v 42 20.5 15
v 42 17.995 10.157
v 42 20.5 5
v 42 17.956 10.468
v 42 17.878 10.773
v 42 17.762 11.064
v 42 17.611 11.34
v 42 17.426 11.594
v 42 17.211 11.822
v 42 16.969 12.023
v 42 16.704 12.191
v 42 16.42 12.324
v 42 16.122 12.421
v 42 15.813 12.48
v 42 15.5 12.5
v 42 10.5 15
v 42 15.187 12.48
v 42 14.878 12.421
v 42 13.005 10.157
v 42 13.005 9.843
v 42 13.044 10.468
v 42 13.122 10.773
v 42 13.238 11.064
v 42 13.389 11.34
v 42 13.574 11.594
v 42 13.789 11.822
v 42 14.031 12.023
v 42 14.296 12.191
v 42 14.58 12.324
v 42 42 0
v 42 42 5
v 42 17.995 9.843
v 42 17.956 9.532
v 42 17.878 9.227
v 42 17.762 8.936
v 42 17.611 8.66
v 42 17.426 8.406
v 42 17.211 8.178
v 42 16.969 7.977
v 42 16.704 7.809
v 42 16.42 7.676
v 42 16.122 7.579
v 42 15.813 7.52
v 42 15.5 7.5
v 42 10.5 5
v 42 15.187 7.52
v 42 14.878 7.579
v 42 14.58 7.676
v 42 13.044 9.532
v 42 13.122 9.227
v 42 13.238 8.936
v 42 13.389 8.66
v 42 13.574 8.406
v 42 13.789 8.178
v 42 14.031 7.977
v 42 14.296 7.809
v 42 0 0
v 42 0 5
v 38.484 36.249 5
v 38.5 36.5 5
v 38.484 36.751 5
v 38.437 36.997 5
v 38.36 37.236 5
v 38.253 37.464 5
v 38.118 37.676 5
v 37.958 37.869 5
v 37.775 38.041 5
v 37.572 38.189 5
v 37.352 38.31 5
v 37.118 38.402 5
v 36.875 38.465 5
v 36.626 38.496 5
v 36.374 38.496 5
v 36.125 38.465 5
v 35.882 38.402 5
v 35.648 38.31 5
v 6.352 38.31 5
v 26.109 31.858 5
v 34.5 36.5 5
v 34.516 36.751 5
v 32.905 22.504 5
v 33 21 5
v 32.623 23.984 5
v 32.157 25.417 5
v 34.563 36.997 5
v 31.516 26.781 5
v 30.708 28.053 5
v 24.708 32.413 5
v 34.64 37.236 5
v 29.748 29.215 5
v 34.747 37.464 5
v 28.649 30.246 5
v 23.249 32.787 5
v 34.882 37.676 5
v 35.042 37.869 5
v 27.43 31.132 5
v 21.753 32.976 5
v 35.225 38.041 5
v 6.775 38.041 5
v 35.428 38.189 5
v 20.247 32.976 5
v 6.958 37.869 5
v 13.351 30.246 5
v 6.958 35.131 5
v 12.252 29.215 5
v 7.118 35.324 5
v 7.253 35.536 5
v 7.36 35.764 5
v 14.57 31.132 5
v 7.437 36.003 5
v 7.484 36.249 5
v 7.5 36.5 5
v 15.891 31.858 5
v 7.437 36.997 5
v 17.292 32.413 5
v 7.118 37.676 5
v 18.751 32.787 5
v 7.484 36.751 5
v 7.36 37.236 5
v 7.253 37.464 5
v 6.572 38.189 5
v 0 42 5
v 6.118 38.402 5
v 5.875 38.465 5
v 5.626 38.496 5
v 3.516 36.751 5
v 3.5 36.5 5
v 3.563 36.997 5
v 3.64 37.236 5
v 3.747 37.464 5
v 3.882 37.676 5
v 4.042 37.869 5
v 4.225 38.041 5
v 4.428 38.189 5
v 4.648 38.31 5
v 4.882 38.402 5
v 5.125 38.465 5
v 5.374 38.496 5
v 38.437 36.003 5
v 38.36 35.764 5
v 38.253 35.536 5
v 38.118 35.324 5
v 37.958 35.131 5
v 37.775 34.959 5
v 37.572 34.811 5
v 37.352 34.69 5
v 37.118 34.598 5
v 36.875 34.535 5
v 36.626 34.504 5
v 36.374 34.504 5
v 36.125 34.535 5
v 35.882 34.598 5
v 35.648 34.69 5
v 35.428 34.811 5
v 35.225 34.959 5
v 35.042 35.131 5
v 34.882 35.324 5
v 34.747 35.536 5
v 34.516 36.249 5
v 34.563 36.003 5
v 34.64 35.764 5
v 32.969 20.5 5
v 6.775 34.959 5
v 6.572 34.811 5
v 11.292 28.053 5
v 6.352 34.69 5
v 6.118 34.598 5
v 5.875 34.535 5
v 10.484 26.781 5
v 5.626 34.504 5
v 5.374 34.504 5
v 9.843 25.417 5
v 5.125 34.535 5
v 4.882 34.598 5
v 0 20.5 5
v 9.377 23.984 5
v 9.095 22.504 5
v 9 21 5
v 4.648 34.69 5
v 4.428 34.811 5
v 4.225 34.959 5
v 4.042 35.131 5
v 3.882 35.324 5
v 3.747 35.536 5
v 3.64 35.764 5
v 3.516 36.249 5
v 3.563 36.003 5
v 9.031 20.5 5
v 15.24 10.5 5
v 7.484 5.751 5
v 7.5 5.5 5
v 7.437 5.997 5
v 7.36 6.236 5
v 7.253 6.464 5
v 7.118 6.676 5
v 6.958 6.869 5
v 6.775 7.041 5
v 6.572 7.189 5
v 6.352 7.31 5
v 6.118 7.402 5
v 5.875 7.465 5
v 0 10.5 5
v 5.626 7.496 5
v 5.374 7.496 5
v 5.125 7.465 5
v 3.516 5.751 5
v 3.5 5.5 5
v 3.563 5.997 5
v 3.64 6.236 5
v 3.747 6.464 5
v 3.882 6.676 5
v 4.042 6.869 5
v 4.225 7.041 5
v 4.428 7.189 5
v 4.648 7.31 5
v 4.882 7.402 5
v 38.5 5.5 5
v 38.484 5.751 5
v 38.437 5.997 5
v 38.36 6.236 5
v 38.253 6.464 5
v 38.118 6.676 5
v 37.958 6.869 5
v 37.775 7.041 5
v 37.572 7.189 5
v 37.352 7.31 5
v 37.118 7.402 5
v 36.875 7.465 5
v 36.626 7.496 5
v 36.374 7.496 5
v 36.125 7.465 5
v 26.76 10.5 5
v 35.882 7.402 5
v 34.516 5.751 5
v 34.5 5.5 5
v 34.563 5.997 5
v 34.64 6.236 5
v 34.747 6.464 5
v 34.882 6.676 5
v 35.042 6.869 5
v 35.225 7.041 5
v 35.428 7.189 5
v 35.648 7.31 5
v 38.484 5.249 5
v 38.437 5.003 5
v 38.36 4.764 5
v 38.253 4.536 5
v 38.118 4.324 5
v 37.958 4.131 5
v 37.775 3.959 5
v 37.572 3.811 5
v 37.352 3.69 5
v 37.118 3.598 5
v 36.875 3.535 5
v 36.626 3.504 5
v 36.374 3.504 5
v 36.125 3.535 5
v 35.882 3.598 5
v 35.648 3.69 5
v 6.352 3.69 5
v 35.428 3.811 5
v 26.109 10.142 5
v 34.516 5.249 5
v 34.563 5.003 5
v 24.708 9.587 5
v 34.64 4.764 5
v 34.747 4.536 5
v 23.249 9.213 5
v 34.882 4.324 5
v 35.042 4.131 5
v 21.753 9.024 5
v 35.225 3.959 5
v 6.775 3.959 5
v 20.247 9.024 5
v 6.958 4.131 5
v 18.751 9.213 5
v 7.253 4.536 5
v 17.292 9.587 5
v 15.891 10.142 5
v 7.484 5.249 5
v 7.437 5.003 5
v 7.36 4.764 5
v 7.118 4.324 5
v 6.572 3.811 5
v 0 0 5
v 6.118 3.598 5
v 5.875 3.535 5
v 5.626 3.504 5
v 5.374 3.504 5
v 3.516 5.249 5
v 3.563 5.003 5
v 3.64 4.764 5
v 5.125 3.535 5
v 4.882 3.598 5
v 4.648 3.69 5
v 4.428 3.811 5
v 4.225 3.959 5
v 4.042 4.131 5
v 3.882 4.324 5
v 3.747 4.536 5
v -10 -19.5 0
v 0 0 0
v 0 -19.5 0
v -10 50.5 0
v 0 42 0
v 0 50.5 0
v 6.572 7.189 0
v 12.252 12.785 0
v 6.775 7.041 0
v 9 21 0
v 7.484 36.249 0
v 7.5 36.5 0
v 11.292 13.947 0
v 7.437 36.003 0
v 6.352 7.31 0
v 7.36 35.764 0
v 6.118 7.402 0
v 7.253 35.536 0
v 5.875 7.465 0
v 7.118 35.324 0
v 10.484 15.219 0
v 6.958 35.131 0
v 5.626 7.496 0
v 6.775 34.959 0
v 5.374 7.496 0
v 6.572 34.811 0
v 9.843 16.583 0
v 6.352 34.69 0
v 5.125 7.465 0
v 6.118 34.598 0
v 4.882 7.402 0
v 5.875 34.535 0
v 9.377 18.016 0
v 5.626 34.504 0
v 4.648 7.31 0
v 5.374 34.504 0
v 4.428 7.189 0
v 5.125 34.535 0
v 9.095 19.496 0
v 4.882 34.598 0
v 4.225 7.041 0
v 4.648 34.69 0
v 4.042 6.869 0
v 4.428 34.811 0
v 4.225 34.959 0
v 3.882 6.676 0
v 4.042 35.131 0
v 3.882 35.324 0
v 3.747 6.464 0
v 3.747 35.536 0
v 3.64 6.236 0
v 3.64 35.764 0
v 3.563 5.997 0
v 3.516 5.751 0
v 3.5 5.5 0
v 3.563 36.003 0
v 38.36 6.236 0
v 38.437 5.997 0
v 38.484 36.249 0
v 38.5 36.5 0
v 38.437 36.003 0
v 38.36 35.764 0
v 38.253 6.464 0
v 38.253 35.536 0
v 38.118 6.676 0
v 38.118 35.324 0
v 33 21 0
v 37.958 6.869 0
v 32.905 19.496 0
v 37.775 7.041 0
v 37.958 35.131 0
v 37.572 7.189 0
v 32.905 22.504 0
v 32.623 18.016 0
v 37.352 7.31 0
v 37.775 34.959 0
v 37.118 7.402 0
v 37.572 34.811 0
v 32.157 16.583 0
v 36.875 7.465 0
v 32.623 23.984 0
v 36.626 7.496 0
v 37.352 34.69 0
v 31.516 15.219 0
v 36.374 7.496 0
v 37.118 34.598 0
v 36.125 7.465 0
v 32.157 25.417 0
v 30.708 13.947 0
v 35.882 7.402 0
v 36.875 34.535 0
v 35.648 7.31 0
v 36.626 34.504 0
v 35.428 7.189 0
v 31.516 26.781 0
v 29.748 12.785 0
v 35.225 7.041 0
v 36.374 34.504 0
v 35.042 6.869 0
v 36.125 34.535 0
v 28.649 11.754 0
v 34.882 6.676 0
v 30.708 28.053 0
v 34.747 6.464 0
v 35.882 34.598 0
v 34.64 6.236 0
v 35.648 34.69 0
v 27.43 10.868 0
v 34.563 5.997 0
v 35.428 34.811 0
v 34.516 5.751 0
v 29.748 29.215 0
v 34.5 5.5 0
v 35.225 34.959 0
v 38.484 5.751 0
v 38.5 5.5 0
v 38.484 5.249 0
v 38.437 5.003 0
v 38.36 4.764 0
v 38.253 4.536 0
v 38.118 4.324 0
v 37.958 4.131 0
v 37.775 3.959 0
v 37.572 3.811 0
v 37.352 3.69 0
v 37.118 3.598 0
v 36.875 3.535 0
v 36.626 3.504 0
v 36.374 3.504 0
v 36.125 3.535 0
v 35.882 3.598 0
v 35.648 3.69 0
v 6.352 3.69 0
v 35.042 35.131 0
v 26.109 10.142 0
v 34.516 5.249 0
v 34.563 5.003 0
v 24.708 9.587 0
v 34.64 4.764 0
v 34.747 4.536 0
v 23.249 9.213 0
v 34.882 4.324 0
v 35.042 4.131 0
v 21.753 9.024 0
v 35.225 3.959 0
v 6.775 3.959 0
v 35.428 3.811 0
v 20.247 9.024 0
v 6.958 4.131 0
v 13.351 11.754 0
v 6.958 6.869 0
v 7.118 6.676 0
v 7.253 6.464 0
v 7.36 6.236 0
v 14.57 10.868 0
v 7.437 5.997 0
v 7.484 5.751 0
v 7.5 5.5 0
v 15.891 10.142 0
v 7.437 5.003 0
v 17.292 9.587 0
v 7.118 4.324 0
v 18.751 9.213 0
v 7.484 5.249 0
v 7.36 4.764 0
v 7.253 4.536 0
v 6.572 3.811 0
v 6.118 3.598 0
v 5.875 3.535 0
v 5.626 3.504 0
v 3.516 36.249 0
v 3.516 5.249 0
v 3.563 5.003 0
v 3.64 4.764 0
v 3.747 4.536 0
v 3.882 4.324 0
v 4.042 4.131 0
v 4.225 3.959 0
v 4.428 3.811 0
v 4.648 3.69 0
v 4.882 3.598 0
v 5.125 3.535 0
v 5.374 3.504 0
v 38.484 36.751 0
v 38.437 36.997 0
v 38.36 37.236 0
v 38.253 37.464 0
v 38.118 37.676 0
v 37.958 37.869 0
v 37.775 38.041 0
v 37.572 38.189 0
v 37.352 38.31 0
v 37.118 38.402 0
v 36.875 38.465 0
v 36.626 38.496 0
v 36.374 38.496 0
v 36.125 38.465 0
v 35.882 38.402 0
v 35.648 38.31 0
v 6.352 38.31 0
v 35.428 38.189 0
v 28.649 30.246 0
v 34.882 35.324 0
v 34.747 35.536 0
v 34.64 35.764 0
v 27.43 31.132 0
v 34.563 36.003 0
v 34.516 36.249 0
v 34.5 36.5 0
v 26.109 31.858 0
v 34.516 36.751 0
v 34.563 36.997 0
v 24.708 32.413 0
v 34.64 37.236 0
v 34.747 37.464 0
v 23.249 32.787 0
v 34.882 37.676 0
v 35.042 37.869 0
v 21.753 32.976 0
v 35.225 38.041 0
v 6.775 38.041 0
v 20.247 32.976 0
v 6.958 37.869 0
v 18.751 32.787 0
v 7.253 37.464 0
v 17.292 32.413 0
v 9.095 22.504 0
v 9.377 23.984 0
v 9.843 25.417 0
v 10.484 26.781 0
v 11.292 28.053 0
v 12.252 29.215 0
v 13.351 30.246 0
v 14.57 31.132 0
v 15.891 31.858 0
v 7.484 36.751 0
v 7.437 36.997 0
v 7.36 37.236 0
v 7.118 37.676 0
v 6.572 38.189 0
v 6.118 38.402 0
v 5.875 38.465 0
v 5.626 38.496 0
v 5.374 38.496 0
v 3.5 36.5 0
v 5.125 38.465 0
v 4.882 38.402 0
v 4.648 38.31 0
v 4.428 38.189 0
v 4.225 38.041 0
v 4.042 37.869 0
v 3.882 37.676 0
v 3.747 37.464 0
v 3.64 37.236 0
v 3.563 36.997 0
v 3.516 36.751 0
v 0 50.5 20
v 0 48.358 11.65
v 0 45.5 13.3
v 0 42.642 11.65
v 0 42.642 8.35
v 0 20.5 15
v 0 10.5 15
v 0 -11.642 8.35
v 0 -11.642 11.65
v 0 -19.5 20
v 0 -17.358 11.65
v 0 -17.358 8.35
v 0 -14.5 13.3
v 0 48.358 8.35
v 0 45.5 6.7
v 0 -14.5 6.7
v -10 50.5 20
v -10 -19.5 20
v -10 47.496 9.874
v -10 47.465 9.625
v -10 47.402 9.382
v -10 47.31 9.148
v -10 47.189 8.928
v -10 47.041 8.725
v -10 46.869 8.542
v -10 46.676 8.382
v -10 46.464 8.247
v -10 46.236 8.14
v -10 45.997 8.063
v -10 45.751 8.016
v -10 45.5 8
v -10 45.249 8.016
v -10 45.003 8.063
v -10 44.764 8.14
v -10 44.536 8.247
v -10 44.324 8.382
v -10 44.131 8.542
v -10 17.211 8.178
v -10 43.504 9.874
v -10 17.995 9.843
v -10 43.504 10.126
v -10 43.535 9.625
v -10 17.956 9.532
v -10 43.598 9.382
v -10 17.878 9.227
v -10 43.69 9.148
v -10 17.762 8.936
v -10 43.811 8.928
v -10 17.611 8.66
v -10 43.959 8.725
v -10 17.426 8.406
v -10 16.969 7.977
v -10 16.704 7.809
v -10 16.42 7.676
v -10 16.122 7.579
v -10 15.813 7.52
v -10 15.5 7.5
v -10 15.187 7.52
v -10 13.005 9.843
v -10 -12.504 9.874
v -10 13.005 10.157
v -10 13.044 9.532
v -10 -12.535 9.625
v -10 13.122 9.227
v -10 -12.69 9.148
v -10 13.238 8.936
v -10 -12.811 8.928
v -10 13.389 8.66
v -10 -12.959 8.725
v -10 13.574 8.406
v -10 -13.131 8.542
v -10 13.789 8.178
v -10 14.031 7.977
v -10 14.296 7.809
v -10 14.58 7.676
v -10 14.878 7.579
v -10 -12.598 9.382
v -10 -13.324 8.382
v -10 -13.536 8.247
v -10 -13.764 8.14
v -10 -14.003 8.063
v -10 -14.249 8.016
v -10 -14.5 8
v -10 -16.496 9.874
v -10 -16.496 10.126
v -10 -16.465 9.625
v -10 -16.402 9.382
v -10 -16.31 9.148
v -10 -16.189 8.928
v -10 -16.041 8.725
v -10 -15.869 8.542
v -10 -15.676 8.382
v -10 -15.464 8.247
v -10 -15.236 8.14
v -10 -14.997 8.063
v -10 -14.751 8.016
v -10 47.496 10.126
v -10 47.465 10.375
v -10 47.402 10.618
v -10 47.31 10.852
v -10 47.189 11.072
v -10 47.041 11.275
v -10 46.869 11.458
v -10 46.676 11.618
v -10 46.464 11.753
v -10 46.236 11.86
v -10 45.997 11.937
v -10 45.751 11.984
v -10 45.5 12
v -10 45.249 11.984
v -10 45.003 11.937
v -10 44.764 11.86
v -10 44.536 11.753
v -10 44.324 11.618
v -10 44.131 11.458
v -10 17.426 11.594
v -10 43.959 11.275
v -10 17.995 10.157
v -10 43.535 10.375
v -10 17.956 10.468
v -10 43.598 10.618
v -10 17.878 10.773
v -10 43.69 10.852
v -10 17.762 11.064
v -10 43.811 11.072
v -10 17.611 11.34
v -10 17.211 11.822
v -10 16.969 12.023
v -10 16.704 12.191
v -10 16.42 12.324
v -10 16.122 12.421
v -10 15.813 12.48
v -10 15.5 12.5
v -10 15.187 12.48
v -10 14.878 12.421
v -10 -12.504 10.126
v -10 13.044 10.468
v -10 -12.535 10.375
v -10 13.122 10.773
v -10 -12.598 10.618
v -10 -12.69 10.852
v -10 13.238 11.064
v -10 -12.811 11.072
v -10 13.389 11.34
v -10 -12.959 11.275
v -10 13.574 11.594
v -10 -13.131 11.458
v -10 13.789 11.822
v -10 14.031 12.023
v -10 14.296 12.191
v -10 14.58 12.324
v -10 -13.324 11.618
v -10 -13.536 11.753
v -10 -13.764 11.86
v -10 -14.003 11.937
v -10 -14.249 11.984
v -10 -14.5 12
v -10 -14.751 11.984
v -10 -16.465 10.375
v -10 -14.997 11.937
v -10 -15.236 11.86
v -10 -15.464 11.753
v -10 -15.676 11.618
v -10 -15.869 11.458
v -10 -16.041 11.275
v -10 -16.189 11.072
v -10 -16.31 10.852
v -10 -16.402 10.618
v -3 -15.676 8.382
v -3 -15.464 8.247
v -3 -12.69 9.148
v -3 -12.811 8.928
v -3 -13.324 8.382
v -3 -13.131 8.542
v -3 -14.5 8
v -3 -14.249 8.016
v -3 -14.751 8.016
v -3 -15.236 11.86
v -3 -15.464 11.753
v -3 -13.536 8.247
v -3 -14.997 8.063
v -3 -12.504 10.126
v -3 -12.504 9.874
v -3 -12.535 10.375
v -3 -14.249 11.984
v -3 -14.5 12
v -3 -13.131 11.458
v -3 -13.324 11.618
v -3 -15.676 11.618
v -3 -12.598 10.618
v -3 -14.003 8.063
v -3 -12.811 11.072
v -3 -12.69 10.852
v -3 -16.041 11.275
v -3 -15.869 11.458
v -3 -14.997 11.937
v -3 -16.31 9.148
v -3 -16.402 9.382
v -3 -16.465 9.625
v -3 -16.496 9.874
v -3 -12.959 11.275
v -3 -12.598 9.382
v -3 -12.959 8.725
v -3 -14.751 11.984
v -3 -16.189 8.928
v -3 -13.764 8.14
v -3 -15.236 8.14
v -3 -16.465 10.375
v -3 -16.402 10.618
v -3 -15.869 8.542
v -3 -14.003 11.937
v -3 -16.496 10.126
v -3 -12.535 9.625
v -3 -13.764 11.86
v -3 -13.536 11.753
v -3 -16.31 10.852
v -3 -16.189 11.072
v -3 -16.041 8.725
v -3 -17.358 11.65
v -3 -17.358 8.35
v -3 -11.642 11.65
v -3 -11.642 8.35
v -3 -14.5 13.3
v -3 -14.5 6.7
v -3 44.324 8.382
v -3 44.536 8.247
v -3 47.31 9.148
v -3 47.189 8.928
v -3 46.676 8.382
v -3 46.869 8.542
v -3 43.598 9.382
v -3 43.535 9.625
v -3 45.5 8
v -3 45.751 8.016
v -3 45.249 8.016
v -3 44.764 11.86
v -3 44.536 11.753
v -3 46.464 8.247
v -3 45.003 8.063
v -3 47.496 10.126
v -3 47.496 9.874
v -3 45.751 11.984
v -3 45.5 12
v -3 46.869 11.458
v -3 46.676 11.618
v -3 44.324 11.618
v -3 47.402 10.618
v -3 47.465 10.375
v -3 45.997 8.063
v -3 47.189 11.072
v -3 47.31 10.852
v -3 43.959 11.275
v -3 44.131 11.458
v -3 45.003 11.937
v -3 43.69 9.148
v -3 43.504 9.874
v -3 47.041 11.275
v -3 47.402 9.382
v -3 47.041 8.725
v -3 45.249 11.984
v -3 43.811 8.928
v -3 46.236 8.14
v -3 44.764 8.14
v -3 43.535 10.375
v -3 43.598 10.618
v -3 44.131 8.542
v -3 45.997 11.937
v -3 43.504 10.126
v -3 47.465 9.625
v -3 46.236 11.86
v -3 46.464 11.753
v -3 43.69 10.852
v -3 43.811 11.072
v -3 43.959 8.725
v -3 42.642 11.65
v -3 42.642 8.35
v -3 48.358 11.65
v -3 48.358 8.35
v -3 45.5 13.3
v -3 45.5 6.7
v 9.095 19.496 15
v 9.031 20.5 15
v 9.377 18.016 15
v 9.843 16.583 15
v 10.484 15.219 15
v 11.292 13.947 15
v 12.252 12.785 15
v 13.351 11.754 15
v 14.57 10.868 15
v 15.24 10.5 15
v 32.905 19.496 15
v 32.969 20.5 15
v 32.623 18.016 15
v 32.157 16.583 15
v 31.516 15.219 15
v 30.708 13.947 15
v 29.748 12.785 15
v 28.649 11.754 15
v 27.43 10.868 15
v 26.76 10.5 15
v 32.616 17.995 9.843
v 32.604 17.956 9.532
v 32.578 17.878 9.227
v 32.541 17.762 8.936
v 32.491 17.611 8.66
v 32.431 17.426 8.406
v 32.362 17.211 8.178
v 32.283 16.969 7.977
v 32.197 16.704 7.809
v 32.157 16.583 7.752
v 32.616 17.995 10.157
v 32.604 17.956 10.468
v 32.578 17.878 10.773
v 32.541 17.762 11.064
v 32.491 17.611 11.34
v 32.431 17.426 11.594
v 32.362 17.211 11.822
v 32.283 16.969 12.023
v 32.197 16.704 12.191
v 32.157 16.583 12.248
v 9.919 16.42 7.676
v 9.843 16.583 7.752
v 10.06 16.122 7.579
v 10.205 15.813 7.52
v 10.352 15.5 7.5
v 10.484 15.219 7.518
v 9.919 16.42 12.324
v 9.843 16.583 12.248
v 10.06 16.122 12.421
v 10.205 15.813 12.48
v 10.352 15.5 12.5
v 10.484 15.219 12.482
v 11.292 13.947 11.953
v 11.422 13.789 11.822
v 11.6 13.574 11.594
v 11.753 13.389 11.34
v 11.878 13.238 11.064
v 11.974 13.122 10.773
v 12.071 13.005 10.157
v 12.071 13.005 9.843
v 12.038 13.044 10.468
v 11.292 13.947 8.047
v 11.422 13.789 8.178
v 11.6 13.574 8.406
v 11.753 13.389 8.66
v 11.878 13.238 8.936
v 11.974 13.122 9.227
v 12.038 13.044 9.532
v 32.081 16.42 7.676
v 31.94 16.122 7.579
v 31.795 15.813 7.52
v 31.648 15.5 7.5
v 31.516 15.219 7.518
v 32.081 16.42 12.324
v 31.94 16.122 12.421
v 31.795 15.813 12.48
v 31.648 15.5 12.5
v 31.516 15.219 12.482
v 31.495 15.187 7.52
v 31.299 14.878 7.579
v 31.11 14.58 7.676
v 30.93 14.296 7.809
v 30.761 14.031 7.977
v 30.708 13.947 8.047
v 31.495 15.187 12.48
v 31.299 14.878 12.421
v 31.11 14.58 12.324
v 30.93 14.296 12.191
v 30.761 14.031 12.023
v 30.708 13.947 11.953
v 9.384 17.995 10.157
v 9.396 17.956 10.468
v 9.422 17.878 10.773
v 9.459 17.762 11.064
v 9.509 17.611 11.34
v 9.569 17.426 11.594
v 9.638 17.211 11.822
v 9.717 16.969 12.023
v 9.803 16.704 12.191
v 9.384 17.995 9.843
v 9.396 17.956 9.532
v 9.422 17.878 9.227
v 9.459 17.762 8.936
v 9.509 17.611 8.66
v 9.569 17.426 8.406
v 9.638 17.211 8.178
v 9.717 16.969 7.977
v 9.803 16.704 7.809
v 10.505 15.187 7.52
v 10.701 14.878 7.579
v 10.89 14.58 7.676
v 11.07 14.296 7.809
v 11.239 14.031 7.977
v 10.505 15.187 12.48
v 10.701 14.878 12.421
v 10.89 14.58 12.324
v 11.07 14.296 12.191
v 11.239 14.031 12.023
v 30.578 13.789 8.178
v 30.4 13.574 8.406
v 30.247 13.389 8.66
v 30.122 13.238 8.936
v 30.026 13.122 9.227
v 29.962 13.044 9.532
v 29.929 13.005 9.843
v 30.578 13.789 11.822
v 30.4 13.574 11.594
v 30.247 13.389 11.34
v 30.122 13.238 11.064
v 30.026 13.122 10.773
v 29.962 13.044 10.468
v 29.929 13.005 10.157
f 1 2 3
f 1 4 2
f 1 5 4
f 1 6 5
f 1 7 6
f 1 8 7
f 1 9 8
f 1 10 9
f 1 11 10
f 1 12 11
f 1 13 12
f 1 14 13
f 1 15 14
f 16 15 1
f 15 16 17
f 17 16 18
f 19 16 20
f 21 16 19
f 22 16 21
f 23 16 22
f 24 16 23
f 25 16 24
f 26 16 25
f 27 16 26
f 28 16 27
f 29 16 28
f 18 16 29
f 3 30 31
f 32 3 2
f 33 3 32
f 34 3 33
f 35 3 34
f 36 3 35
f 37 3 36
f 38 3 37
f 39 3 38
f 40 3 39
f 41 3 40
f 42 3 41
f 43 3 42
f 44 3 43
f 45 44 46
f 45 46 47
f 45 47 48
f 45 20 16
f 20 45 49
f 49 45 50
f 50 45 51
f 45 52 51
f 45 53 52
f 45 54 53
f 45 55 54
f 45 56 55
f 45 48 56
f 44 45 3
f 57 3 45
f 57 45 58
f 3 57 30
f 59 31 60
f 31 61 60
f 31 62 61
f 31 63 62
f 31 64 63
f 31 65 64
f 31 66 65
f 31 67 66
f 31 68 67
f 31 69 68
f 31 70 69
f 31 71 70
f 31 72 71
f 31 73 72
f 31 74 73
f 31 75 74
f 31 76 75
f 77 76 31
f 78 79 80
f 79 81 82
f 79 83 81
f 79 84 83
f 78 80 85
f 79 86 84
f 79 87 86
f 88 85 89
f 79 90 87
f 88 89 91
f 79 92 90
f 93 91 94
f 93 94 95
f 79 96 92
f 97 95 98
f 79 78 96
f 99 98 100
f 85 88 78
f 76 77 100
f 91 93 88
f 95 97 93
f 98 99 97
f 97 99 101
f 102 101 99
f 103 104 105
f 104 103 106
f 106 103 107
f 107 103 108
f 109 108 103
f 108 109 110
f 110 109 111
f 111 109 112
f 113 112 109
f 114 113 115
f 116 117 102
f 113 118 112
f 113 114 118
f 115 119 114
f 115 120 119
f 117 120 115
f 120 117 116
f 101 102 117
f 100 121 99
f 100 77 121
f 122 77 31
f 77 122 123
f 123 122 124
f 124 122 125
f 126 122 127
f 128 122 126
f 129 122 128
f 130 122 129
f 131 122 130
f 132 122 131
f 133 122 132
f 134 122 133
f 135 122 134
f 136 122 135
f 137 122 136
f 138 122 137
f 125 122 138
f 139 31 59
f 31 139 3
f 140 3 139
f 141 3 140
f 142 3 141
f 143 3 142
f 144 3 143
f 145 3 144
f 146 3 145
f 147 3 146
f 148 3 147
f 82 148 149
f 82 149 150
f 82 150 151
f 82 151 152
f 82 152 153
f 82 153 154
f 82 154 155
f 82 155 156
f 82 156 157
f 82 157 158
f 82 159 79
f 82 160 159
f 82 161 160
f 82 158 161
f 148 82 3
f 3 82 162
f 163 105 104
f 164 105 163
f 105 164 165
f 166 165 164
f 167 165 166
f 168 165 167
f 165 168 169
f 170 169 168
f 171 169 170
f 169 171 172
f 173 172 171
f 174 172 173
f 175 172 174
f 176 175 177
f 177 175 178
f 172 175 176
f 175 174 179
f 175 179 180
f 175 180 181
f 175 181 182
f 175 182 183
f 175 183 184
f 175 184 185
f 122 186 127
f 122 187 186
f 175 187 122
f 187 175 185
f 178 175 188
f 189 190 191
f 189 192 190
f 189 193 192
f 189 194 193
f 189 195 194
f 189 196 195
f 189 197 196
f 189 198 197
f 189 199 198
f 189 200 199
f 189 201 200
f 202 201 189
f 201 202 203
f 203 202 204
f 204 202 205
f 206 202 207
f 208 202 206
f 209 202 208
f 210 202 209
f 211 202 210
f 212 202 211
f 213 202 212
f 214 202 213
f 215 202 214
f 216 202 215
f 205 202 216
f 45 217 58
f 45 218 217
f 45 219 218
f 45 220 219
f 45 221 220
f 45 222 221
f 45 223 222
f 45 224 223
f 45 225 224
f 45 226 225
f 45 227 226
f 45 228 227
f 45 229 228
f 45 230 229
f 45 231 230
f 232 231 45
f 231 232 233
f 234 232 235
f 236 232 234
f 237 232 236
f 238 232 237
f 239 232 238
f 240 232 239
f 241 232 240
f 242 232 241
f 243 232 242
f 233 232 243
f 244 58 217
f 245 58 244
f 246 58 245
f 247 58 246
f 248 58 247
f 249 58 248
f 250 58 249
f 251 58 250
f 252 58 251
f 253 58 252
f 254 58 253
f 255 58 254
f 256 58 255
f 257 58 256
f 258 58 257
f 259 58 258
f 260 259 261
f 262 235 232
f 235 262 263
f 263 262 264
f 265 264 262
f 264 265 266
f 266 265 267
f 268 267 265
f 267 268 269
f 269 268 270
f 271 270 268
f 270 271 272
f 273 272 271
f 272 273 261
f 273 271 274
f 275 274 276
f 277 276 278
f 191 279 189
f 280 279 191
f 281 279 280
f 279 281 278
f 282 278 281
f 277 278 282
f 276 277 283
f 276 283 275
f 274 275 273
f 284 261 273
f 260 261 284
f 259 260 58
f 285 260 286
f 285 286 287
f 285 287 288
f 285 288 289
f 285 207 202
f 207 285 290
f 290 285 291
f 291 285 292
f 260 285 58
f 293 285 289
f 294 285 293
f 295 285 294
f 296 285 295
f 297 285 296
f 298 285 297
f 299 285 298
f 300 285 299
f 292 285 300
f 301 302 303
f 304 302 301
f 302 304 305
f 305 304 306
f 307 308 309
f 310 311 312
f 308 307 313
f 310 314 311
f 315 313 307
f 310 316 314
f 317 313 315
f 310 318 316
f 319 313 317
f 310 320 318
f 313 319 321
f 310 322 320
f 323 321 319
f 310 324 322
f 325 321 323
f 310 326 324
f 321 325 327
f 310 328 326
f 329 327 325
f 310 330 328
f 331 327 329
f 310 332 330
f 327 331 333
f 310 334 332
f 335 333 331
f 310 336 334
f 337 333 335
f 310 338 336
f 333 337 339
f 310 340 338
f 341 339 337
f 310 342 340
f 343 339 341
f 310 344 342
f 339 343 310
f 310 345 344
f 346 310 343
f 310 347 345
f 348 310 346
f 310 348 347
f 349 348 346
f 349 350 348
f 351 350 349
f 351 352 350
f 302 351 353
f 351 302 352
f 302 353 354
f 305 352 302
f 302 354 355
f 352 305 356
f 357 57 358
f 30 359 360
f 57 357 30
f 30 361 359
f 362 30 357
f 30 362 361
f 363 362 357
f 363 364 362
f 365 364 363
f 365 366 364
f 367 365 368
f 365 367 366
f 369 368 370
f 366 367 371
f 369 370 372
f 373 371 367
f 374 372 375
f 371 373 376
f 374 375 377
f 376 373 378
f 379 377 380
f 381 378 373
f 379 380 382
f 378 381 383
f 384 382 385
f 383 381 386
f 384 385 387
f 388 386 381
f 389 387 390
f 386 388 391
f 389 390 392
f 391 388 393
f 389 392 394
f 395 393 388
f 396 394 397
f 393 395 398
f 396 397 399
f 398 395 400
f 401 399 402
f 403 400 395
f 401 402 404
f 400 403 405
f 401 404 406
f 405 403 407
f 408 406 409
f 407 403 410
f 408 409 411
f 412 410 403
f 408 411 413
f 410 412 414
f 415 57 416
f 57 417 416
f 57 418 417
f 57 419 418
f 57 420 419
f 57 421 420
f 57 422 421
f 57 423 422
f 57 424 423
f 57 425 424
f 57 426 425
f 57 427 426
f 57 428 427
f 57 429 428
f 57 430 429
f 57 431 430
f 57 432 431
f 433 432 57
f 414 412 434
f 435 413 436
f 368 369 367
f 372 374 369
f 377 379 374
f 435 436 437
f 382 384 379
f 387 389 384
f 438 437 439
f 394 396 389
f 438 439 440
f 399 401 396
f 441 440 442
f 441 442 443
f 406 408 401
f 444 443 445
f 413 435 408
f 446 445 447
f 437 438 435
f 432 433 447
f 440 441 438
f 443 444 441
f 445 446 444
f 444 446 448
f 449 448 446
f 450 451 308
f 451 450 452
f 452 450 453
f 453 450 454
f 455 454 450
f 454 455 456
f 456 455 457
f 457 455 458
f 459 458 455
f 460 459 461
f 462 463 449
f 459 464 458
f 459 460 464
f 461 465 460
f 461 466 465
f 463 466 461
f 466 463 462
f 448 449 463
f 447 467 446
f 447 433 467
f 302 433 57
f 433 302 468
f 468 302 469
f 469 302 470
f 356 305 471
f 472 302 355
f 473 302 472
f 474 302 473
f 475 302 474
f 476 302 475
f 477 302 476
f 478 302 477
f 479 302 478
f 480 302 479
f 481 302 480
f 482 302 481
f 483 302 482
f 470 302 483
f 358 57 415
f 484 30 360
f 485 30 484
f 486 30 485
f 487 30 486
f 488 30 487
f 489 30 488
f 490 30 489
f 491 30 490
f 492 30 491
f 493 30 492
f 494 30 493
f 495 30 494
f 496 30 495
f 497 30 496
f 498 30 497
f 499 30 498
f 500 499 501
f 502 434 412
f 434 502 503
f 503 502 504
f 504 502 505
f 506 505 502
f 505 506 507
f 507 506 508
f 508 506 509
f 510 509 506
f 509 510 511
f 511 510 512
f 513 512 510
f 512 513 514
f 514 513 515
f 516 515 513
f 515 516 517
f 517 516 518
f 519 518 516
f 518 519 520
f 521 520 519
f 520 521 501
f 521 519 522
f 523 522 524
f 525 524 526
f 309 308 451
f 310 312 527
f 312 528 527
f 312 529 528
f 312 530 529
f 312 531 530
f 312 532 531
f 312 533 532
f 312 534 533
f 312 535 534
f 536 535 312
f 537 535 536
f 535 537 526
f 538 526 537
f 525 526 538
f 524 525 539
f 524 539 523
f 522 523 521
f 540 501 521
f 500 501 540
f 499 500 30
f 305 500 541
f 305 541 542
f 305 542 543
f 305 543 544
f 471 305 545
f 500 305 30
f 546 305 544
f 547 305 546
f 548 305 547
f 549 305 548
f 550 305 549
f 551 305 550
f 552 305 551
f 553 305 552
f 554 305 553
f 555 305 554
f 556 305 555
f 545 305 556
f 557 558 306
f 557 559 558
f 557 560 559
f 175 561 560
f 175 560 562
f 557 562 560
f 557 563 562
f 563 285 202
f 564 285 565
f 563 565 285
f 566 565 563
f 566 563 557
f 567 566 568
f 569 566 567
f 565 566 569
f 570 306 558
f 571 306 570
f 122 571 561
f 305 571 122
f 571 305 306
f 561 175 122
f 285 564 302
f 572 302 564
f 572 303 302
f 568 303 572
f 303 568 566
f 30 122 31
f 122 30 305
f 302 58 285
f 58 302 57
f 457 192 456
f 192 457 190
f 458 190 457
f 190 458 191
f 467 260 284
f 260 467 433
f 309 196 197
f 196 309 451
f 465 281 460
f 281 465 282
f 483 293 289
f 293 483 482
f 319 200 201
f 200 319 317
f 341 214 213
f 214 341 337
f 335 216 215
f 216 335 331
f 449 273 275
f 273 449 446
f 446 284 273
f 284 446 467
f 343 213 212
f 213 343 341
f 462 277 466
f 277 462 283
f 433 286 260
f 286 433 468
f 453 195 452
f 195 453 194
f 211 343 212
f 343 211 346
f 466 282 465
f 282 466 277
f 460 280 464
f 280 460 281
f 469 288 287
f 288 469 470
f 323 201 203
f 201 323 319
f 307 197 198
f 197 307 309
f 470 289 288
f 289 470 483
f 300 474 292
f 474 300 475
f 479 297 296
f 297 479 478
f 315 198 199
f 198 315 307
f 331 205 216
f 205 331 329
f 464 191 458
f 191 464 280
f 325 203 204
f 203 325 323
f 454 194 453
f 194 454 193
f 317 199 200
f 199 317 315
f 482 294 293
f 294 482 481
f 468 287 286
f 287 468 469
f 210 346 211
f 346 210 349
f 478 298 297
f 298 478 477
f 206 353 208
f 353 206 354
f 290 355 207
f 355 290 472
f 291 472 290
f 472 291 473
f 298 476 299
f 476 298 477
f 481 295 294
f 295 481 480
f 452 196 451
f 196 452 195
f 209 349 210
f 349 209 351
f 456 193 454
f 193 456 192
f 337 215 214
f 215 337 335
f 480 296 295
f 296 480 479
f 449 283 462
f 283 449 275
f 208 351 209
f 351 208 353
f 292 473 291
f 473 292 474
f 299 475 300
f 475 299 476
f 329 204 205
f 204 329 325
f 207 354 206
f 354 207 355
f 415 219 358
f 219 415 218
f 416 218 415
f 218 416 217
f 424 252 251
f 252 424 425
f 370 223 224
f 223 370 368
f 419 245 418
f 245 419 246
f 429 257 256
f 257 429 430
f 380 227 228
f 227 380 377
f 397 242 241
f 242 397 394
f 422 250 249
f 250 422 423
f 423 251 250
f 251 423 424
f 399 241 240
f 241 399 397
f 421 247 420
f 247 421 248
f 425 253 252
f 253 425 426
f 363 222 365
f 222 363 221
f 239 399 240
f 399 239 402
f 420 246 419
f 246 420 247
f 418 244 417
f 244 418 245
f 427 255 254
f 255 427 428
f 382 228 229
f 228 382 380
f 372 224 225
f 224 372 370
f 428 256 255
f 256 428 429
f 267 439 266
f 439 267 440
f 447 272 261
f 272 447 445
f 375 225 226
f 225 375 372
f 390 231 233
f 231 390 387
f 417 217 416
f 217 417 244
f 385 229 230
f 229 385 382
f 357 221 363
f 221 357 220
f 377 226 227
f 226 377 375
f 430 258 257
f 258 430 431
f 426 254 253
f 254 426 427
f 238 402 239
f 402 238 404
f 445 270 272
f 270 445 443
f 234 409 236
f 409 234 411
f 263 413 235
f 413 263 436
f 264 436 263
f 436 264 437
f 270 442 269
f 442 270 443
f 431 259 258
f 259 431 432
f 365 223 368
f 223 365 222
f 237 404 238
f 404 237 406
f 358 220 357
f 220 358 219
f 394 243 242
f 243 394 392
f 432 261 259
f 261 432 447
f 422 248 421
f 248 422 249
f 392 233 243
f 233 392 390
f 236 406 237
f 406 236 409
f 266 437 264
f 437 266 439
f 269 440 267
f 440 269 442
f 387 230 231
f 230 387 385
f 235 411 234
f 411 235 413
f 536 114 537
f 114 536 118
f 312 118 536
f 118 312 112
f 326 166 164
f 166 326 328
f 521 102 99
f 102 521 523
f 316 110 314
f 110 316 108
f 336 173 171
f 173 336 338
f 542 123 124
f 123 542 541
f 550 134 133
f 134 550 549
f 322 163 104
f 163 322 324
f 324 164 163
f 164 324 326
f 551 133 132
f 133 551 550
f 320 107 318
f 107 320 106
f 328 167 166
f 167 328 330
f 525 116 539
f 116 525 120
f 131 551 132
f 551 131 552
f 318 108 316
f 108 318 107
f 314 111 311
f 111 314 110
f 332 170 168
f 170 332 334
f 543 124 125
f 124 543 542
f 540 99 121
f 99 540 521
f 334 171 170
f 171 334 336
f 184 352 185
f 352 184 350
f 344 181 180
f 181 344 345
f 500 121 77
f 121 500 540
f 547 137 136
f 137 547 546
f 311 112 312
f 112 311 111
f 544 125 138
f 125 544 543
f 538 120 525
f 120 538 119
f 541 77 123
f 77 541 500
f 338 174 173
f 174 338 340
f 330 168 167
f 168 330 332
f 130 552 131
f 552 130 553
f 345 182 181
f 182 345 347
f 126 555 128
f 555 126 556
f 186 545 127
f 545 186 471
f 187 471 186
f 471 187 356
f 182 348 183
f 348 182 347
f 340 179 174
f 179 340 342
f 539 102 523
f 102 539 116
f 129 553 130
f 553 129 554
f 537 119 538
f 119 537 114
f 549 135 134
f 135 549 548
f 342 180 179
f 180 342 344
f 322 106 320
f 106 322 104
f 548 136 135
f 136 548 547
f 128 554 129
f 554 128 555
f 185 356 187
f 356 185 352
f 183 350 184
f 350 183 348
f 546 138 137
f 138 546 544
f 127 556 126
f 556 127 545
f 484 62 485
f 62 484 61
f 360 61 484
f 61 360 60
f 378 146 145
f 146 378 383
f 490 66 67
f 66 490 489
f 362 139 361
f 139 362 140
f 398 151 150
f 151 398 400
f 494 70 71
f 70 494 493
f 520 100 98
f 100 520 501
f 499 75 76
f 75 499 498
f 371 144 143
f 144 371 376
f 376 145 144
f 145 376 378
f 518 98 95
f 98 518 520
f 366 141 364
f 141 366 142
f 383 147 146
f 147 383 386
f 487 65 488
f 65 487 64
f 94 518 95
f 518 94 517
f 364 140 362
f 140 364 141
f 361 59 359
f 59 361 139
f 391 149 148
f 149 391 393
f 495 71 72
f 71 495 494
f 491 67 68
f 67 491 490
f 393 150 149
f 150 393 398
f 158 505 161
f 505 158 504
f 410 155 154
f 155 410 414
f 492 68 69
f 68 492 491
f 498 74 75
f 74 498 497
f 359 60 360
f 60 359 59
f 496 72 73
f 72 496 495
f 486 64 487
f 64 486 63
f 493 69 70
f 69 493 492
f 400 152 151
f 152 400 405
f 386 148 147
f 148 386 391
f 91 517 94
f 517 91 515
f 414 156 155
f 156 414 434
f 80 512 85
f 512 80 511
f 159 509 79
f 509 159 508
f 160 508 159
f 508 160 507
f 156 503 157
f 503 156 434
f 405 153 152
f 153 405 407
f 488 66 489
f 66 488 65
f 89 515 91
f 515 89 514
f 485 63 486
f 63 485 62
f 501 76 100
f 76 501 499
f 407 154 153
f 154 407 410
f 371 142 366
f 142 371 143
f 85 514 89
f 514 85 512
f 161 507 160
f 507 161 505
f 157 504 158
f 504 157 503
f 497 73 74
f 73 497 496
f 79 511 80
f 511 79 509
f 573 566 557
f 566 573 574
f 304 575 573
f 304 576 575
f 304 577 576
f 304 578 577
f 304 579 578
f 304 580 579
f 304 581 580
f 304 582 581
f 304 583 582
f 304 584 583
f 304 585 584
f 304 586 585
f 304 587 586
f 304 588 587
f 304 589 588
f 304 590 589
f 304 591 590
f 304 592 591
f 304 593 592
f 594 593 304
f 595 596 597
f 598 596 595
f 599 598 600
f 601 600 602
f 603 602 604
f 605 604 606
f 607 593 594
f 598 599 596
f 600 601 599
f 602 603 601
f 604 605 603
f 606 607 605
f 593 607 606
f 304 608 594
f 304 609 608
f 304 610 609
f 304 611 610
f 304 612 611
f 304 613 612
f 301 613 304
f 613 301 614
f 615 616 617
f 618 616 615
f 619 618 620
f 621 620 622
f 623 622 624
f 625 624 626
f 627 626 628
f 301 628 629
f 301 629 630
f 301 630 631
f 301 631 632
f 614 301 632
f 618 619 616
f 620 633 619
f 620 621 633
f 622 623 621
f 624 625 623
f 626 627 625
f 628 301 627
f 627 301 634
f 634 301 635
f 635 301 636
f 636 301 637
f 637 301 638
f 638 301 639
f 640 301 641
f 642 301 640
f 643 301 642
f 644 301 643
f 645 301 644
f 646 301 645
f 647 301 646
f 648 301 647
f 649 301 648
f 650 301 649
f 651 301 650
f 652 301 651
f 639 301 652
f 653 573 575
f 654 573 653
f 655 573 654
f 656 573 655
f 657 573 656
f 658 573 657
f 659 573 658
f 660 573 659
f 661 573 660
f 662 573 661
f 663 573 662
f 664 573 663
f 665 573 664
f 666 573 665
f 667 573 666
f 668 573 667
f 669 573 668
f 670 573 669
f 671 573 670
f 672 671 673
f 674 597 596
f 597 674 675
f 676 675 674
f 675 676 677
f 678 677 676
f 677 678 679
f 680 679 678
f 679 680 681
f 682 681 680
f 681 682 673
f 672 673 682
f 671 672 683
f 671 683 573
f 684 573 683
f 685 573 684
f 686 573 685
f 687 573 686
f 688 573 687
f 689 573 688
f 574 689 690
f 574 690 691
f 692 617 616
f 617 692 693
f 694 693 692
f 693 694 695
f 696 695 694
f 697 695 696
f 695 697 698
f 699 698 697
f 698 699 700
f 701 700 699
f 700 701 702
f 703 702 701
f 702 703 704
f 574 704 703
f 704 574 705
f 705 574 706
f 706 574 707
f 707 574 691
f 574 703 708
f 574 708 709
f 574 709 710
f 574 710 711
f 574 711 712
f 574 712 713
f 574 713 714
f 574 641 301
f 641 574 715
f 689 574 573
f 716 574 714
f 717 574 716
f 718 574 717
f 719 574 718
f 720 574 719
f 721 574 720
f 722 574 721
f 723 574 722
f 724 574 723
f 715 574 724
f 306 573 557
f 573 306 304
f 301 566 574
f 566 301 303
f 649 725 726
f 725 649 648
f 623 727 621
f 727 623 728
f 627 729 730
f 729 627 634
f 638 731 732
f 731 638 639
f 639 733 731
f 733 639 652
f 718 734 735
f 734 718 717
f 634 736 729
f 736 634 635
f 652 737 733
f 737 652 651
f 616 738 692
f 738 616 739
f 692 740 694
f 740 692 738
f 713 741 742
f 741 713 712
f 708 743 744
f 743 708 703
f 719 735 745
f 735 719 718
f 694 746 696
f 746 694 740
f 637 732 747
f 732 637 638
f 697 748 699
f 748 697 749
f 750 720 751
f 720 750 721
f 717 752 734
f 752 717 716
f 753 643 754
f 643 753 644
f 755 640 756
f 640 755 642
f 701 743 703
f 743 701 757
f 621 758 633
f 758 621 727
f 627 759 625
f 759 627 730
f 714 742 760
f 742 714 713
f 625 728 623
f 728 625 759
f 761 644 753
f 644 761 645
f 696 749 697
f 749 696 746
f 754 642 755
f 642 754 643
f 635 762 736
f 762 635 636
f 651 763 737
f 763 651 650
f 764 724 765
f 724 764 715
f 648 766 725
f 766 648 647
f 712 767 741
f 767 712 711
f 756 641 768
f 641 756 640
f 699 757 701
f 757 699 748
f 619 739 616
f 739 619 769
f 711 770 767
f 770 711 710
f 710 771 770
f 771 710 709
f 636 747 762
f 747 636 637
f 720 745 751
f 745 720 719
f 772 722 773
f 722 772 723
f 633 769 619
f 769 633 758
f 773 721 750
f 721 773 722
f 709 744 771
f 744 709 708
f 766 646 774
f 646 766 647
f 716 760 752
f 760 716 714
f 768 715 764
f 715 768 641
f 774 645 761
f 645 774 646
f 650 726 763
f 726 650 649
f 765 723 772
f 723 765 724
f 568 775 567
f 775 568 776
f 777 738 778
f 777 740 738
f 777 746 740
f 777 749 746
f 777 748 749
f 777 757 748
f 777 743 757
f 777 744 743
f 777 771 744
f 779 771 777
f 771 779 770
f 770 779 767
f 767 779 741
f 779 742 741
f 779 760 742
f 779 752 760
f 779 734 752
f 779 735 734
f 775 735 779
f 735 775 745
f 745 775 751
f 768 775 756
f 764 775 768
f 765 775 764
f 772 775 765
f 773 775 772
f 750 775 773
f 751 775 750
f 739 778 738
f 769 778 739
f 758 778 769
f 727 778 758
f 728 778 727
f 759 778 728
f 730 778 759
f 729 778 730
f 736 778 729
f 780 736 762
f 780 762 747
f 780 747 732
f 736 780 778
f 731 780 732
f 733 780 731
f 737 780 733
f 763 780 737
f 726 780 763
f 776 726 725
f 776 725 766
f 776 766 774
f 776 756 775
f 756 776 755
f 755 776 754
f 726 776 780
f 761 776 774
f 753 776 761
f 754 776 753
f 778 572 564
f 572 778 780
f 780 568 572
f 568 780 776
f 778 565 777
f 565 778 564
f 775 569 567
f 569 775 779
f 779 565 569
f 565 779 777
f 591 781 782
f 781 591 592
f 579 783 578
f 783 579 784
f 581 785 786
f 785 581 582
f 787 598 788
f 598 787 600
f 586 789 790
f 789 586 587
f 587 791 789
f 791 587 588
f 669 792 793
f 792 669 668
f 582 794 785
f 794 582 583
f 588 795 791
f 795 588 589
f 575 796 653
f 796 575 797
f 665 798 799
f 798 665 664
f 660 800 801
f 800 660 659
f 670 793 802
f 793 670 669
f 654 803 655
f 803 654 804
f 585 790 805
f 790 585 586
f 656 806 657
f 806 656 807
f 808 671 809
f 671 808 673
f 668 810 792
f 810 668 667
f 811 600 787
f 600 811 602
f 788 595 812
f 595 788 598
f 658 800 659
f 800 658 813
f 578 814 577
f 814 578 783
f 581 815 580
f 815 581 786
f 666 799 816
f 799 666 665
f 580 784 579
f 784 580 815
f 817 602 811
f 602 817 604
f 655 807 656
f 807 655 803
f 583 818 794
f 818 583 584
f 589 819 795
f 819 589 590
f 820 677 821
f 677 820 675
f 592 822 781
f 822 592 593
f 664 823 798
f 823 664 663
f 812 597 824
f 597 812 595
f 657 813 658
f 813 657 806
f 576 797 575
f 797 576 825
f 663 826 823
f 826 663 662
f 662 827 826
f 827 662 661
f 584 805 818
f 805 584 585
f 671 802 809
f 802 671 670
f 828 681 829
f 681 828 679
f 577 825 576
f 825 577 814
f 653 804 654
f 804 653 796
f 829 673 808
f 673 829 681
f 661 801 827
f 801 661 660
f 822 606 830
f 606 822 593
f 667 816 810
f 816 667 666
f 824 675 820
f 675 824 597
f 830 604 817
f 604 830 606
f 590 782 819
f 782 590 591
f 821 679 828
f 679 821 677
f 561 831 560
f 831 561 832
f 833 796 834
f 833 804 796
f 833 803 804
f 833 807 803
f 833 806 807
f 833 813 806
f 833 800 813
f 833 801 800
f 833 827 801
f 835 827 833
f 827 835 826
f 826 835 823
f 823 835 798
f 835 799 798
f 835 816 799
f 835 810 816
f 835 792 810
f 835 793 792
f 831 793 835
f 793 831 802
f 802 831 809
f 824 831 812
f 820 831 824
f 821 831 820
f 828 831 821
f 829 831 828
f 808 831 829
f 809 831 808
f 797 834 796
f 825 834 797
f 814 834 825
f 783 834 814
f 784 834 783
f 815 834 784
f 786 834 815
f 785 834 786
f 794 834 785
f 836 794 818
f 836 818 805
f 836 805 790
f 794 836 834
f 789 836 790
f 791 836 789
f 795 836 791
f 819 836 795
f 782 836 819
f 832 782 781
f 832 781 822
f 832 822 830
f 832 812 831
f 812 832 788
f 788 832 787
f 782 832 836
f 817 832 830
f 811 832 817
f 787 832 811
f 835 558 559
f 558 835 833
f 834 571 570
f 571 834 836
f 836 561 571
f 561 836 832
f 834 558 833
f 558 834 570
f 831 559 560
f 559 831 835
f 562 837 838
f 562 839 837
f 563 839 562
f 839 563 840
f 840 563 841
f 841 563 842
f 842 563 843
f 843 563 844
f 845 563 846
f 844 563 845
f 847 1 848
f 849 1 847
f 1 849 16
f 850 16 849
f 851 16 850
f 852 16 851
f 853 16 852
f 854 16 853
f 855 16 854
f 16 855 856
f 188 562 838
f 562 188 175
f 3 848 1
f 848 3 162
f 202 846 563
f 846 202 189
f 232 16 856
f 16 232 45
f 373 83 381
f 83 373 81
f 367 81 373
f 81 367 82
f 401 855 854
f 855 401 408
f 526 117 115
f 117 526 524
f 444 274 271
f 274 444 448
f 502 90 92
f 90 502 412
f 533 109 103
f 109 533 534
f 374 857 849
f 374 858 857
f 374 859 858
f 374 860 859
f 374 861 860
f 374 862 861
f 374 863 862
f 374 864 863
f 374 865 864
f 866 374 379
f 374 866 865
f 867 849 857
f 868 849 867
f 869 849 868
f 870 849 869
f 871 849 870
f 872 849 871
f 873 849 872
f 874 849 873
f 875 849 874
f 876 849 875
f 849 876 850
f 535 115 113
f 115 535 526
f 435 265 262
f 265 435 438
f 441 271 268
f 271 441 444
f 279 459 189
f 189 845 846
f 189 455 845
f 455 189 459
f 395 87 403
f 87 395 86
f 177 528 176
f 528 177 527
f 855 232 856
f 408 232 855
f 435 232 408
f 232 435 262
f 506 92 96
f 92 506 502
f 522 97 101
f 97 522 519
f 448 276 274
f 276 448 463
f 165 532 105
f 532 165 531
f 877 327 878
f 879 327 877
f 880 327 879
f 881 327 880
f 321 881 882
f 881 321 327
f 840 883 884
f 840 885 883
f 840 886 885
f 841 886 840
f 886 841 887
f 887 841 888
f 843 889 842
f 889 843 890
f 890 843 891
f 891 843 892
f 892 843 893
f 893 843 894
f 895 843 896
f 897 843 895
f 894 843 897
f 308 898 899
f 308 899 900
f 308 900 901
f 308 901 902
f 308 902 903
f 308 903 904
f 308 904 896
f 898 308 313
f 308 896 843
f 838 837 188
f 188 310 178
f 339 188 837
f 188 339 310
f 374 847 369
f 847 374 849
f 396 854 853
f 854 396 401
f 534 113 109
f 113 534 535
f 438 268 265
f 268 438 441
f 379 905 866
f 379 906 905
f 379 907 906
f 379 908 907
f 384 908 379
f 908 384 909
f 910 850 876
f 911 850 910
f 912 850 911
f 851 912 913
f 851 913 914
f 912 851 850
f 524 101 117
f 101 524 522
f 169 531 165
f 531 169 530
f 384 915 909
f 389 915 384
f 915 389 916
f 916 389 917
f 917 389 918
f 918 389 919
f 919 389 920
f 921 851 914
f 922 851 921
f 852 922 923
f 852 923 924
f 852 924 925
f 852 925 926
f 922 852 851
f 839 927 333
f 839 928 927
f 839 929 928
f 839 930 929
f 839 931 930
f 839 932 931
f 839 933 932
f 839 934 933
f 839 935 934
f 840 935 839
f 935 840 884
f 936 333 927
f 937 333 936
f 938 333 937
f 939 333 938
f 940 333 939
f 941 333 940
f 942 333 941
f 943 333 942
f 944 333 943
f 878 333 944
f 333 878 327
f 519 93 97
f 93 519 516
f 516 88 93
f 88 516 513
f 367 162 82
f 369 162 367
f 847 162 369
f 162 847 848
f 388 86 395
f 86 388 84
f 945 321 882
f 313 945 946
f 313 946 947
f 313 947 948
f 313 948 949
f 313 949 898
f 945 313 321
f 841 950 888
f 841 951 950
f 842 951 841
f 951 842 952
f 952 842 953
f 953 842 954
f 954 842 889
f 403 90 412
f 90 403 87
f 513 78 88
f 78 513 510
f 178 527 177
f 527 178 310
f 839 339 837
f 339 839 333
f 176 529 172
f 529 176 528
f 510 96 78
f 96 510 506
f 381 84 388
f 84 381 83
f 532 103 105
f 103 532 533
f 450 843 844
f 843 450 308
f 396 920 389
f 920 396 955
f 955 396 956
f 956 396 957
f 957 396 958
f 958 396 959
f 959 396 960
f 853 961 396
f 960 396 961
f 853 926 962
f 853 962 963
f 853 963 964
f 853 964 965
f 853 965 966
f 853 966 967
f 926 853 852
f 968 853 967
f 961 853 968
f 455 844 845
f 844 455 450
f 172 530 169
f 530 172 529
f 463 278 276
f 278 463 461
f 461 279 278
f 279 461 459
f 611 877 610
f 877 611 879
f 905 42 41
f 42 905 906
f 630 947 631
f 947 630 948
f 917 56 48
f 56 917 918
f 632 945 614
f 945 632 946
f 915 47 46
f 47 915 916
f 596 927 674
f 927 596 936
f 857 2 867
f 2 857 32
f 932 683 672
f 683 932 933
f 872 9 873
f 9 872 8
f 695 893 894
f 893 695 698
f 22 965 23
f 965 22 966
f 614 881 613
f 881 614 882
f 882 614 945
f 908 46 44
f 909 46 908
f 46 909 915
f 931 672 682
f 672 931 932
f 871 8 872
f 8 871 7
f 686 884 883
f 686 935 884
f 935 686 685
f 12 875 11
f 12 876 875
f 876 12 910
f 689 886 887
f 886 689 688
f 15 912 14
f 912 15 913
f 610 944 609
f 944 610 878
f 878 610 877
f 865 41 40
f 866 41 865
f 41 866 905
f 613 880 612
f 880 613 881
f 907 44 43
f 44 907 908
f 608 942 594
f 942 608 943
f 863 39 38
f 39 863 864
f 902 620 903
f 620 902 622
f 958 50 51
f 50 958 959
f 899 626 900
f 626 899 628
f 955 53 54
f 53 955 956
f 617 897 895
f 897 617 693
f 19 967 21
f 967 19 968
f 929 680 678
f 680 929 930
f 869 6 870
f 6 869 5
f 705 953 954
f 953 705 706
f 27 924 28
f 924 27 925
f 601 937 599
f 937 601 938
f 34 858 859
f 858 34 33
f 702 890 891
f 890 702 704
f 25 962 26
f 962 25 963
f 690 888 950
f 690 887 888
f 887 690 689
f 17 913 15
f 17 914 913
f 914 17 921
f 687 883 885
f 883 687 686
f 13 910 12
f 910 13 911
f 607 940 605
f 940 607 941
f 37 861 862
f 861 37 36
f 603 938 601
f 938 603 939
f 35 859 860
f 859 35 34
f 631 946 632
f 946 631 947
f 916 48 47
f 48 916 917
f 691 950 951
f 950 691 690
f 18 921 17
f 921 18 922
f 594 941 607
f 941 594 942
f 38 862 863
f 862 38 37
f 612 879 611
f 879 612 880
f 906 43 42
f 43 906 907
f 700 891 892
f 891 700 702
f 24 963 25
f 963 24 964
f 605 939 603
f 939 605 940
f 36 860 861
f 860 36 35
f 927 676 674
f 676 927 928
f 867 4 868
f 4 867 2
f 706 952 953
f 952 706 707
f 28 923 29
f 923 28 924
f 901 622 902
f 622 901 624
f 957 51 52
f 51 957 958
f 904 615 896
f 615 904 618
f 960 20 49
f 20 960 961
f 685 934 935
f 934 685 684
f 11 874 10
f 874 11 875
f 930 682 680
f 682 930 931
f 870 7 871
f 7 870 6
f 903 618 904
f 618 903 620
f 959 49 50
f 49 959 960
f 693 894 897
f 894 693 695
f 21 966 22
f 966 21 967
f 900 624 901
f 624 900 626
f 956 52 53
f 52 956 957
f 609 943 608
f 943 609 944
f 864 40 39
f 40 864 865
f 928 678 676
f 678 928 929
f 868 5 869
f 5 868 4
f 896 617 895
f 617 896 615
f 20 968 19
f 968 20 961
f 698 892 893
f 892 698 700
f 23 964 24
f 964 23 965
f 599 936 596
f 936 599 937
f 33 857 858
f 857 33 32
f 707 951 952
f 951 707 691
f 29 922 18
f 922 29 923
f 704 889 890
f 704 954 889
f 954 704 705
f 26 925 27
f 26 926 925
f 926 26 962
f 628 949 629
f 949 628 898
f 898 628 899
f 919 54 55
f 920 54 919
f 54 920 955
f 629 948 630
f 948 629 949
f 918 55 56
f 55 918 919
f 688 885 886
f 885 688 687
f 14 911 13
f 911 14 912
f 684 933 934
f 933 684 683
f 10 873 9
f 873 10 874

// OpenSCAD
r_trou_m3=2;
r_ecrou_m3=3.3;
height_plaque_moteur=5;
cote_moteur=42;
r_pignon=4;
ep_fixation=10;
r_trou_filament=2.5;
height_passage_filament=10;
r_filament=1.5;
larg_fixation=70;


module plaque_moteur(){
	
	difference(){
	cube([cote_moteur,cote_moteur,height_plaque_moteur]);

	translate([5.5,5.5,-5]){cylinder(h = height_plaque_moteur+10, r = r_trou_m3, $fn=50);}
	translate([cote_moteur-5.5,5.5,-5]){cylinder(h = height_plaque_moteur+10, r = r_trou_m3, $fn=50);}
	translate([5.5,cote_moteur-5.5,-5]){cylinder(h = height_plaque_moteur+10, r = r_trou_m3, $fn=50);}
	translate([cote_moteur-5.5,cote_moteur-5.5,-5]){cylinder(h = height_plaque_moteur+10, r = r_trou_m3, $fn=50);}
	}
}

module passage_filament(){
	cube([cote_moteur,10,height_passage_filament]);
}

module fixation(){
	difference(){
	cube([ep_fixation,larg_fixation,height_plaque_moteur*2+height_passage_filament]);
	
	translate([-ep_fixation-15,5,(height_plaque_moteur*2+height_passage_filament)/2]){rotate([0,90,0])cylinder(h = 50, r = r_trou_m3, $fn=50);}
	translate([ep_fixation-3,5,(height_plaque_moteur*2+height_passage_filament)/2]){rotate([0,90,0])cylinder(h = 50, r = r_ecrou_m3, $fn=6);}
	translate([ep_fixation-15,larg_fixation-5,(height_plaque_moteur*2+height_passage_filament)/2]){rotate([0,90,0])cylinder(h = 50, r = r_trou_m3, $fn=50);}
	translate([ep_fixation-3,larg_fixation-5,(height_plaque_moteur*2+height_passage_filament)/2]){rotate([0,90,0])cylinder(h = 50, r = r_ecrou_m3, $fn=6);}
	}
}

module ensemble(){
	plaque_moteur();	
	translate([-ep_fixation,-19.5,0]){fixation();}
	translate([0,10.5,5]){passage_filament();}
difference(){
	plaque_moteur();
	
	}
}

difference(){
	ensemble();
	translate([cote_moteur/2,cote_moteur/2,-5]){cylinder(h = 50, r = 12, $fn=50);}
	translate([-ep_fixation-10,15.5,(height_plaque_moteur*2+height_passage_filament)/2]){rotate([0,90,0])cylinder(h = 100, r = r_trou_filament, $fn=50);}
	}
